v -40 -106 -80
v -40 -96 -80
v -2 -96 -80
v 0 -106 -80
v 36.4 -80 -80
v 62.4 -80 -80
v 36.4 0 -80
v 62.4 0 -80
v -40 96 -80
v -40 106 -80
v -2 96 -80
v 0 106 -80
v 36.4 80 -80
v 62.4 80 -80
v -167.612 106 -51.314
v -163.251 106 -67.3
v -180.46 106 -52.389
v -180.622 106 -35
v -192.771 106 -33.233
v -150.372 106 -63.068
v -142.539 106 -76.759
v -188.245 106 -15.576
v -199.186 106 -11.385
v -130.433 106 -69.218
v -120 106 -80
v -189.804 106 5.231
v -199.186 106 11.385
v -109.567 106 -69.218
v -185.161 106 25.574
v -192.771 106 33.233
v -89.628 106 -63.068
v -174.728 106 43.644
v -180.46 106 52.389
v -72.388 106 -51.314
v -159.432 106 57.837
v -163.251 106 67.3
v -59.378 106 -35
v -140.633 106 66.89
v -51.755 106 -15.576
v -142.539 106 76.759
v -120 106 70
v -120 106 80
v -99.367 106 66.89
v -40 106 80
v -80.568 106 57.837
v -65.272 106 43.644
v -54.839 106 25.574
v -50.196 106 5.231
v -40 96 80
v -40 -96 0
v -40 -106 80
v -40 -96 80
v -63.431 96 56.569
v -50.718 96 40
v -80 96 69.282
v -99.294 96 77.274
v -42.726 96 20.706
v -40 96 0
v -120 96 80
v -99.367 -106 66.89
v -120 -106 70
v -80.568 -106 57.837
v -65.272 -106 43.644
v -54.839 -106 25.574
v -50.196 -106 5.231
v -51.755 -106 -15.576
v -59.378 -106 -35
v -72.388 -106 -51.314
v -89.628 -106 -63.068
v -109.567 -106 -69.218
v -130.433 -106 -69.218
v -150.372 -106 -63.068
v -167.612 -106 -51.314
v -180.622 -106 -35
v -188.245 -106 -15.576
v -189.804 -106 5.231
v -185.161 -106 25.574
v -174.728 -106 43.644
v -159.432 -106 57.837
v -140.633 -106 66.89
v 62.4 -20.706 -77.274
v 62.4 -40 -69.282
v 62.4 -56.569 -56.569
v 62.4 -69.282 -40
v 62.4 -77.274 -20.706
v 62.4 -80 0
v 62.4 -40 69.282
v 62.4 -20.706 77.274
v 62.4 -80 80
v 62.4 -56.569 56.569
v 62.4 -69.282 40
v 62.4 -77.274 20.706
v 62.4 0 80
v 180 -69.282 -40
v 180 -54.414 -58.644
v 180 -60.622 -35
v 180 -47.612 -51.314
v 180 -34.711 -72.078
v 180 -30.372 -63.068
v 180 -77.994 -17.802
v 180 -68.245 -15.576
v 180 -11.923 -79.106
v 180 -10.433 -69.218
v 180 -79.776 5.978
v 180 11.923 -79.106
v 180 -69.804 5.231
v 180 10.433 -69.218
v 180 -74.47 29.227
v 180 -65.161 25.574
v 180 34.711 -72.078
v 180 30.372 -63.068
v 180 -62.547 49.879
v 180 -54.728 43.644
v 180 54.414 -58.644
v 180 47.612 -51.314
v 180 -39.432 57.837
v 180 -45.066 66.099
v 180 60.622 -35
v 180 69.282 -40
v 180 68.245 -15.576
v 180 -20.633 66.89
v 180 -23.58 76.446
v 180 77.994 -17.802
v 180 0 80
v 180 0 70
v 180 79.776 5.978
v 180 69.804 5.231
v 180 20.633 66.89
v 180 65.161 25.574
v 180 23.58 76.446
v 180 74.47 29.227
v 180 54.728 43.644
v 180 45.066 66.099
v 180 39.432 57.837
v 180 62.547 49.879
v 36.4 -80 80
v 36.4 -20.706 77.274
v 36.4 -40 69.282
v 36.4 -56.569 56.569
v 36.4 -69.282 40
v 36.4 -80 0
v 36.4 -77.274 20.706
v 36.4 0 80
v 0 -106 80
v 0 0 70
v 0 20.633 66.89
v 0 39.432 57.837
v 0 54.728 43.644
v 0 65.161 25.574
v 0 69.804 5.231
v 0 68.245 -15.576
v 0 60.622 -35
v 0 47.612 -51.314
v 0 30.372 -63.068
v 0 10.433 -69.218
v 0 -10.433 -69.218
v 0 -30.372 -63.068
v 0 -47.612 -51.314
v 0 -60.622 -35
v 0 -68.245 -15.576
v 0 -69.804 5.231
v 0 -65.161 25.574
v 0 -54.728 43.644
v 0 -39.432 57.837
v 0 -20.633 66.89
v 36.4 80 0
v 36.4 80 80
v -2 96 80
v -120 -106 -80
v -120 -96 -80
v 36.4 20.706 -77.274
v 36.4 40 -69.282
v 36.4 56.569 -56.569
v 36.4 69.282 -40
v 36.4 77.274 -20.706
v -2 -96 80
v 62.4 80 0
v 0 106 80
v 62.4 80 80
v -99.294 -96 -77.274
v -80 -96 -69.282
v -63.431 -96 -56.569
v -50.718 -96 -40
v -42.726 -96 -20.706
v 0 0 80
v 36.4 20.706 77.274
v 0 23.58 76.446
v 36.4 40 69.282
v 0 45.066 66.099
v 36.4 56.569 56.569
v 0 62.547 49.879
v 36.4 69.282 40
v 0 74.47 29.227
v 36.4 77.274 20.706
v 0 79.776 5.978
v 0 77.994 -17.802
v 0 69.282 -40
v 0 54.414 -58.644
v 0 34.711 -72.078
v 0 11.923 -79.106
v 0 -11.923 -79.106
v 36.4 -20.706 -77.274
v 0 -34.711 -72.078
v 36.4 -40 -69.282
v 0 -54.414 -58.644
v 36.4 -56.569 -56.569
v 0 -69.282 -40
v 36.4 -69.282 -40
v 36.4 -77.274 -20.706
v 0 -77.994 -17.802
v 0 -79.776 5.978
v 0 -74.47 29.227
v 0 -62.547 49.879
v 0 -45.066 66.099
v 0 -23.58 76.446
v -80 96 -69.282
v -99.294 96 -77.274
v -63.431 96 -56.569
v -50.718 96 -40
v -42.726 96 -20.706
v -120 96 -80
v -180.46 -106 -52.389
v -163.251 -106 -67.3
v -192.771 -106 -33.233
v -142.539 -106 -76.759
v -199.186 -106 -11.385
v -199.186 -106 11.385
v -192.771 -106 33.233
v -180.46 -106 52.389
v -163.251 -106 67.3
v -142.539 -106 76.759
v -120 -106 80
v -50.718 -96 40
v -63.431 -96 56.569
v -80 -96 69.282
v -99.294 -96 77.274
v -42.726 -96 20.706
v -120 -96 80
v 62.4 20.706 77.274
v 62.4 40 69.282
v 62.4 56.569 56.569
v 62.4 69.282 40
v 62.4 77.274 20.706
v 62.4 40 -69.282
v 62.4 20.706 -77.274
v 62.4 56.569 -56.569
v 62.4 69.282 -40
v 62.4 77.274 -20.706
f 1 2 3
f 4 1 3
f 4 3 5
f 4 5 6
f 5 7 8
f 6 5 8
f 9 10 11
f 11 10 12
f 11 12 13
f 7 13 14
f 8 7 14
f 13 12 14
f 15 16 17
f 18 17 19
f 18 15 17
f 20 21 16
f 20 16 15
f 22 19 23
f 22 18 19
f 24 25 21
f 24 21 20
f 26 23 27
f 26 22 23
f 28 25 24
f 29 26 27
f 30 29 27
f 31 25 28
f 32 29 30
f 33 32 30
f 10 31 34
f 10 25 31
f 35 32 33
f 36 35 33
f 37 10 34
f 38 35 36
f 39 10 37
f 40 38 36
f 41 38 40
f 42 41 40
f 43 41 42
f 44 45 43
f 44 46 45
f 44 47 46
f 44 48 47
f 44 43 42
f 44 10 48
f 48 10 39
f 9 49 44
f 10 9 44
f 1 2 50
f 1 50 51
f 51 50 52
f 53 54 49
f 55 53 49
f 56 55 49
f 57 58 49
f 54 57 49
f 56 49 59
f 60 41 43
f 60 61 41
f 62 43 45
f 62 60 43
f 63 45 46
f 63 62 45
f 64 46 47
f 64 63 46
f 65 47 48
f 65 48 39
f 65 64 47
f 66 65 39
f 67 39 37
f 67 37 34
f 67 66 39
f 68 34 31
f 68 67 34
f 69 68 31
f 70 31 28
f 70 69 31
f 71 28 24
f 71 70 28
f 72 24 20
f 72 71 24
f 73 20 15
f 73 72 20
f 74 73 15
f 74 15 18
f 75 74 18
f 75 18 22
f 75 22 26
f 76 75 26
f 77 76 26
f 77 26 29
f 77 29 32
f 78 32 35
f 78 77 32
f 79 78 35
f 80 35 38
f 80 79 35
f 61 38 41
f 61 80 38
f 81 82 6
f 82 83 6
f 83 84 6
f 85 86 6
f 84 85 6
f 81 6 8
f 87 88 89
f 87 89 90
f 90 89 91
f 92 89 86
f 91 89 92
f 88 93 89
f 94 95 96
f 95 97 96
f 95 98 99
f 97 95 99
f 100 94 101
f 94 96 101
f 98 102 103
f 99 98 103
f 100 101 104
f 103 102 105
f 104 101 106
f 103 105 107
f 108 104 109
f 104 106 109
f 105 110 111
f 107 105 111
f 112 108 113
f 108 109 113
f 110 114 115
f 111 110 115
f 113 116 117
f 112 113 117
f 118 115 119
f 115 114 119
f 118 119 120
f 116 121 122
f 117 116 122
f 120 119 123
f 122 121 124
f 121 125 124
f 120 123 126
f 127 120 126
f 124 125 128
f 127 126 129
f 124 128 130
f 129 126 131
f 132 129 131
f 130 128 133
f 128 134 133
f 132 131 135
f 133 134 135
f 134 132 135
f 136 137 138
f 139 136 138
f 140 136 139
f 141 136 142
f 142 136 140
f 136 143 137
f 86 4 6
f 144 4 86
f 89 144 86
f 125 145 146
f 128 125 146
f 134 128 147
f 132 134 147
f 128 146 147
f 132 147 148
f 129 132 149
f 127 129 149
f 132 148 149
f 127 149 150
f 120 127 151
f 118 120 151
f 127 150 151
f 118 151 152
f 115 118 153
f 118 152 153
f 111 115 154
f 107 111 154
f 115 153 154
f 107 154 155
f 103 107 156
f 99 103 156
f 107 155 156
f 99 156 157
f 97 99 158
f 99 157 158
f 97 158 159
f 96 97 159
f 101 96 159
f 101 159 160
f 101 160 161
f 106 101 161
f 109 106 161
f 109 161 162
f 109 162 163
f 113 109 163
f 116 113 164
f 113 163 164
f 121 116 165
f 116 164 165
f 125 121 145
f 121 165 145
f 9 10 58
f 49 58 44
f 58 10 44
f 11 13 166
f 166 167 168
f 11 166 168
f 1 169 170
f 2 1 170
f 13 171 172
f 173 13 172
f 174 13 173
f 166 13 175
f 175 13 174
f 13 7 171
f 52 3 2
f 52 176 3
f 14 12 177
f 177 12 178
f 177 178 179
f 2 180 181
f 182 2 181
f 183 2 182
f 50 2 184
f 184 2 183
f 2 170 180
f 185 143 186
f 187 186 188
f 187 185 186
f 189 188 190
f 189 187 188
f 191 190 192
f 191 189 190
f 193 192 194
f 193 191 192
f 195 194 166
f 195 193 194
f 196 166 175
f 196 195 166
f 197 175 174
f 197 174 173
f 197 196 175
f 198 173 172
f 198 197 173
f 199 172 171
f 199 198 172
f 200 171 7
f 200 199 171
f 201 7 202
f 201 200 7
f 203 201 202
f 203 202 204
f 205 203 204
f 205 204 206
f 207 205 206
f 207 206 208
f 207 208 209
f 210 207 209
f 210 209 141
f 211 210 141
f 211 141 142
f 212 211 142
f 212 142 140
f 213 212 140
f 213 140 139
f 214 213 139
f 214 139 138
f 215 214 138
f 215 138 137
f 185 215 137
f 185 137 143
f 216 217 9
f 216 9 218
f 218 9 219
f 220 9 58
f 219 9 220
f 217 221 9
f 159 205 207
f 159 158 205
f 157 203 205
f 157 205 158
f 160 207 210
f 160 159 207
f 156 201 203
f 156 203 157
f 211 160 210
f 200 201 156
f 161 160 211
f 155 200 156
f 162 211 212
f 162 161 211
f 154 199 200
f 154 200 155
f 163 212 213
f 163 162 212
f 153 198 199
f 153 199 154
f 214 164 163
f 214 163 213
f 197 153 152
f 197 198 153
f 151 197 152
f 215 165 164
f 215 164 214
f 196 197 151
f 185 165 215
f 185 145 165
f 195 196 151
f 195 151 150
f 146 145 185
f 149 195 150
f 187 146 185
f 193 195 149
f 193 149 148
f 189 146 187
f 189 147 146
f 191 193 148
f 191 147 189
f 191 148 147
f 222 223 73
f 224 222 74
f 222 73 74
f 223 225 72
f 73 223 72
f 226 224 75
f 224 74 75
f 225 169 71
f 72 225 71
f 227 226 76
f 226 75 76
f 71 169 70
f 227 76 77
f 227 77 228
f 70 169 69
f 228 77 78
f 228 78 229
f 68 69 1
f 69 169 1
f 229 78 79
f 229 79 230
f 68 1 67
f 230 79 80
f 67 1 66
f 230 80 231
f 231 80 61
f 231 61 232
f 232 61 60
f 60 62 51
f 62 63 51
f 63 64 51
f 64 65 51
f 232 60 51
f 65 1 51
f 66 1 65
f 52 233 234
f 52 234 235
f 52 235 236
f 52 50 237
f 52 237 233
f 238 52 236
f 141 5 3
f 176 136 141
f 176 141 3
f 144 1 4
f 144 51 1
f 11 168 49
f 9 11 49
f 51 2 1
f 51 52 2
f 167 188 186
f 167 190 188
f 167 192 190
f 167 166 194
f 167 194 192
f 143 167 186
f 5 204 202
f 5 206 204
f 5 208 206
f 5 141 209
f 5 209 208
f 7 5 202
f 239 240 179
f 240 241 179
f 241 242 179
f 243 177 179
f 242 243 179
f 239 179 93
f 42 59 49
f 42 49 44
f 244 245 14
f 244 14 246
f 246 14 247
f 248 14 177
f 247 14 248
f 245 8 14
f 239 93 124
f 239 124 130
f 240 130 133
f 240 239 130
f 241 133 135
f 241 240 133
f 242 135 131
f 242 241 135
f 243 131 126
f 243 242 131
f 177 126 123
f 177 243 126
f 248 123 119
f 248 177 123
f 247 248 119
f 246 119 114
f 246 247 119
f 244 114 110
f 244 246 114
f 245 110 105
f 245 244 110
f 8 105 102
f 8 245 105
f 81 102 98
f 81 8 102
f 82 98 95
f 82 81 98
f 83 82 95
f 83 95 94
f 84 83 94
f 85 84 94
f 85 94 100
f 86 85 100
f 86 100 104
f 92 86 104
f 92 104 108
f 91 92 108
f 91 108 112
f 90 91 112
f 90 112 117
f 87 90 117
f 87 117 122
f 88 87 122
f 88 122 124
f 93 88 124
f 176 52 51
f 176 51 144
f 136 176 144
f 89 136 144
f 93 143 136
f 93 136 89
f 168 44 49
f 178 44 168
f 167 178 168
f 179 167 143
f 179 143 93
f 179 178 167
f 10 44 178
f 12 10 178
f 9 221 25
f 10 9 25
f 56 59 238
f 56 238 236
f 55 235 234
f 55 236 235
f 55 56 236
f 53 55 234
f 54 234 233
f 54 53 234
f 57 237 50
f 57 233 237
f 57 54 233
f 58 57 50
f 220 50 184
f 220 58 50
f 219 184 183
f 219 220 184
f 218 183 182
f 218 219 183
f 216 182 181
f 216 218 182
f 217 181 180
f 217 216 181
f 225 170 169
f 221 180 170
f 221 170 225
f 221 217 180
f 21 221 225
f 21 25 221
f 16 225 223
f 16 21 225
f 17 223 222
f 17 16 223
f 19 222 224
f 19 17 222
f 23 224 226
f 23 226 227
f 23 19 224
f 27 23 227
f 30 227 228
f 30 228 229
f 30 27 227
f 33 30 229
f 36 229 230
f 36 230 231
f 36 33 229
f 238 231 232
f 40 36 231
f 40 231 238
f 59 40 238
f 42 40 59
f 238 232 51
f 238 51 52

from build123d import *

# Parameters (mm, degrees)
SKETCH1_R                = 80
SKETCH1_R_2              = 70
BOSS_EXTRUDE1_DEPTH      = 106
SKETCH2_R                = 80
SKETCH2_R_2              = 70
BOSS_EXTRUDE2_DEPTH      = 180
BOSS_EXTRUDE4_DEPTH      = 80
BOSS_EXTRUDE4_2_DEPTH    = 80
BOSS_EXTRUDE8_REACH      = 258.975
BOSS_EXTRUDE8_END_RADIUS = 80
SKETCH6_W                = 160
SKETCH6_H                = 10
BOSS_EXTRUDE9_REACH      = 286.598
SKETCH7_W                = 26
SKETCH7_H                = 160
BOSS_EXTRUDE10_REACH     = 286.598
SKETCH9_W                = 26
SKETCH9_H                = 160


with BuildPart() as part:
    # Sketch1 → Boss-Extrude1 (new, symmetric)
    with BuildSketch(Plane(origin=(0, 0, 0), x_dir=(1, 0, 0), z_dir=(0, 1, 0))):
        with Locations(Location((-120, 0, 0), (0, 0, 270))):
            Circle(SKETCH1_R)
        with Locations(Location((-120, 0, 0), (0, 0, 270))):
            Circle(SKETCH1_R_2, mode=Mode.SUBTRACT)
    extrude(amount=BOSS_EXTRUDE1_DEPTH, both=True)

    # Boss-Extrude8: up to this cylinder (the profile starts outside it)
    boss_extrude8_end = Plane(origin=(-120, 0, 0), z_dir=(0, -1, 0)) * Cylinder(BOSS_EXTRUDE8_END_RADIUS, 880.95, mode=Mode.PRIVATE)
    # Sketch6 → Boss-Extrude8 (add, up to the surface)
    with BuildSketch(Plane.ZY.offset(40), mode=Mode.PRIVATE) as boss_extrude8_sk1:
        with Locations((0, -101)):
            Rectangle(SKETCH6_W, SKETCH6_H)
    boss_extrude8_tool1 = extrude(boss_extrude8_sk1.sketch, amount=BOSS_EXTRUDE8_REACH, mode=Mode.PRIVATE) - boss_extrude8_end
    add(boss_extrude8_tool1.solids().sort_by_distance((-40, -101, 0))[0])
    add(boss_extrude8_tool1.solids().sort_by_distance((-40, -101, 0))[1])
    # Sketch6 → Boss-Extrude8 (add, up to the surface)
    with BuildSketch(Plane.ZY.offset(40), mode=Mode.PRIVATE) as boss_extrude8_sk2:
        with Locations((0, 101)):
            Rectangle(SKETCH6_W, SKETCH6_H)
    boss_extrude8_tool2 = extrude(boss_extrude8_sk2.sketch, amount=BOSS_EXTRUDE8_REACH, mode=Mode.PRIVATE) - boss_extrude8_end
    add(boss_extrude8_tool2.solids().sort_by_distance((-40, 101, 0))[0])
    add(boss_extrude8_tool2.solids().sort_by_distance((-40, 101, 0))[1])


with BuildPart() as body_2:
    # Sketch2 → Boss-Extrude2 (new body)
    with BuildSketch(Plane.ZY):
        Circle(SKETCH2_R)
        Circle(SKETCH2_R_2, mode=Mode.SUBTRACT)
    extrude(amount=-BOSS_EXTRUDE2_DEPTH)

    # Sketch7 → Boss-Extrude9 (add, up to next)
    with BuildSketch(Plane(origin=(0, -80, 0), x_dir=(1, 0, 0), z_dir=(0, 1, 0)), mode=Mode.PRIVATE) as boss_extrude9_sk1:
        with Locations((49.4, 0)):
            Rectangle(SKETCH7_W, SKETCH7_H)
    boss_extrude9_tool1 = extrude(boss_extrude9_sk1.sketch, amount=BOSS_EXTRUDE9_REACH, mode=Mode.PRIVATE) - body_2.part


with BuildPart() as body_3:
    # Sketch4 → Boss-Extrude4 (new, symmetric)
    with BuildSketch(Plane.XY):
        Polygon((-40, 106), (0, 106), (62.4, 80), (36.4, 80), (-2, 96), (-40, 96), align=None)
    extrude(amount=BOSS_EXTRUDE4_DEPTH, both=True)


with BuildPart() as body_4:
    # Sketch4 → Boss-Extrude4 2 (new, symmetric)
    with BuildSketch(Plane.XY):
        Polygon((-40, -106), (0, -106), (62.4, -80), (36.4, -80), (-2, -96), (-40, -96), align=None)
    extrude(amount=BOSS_EXTRUDE4_2_DEPTH, both=True)


with BuildPart() as body_2_1:
    add(body_2.part)

    add(body_4.part)  # Boss-Extrude9 merges body 4
    add(boss_extrude9_tool1.solids().sort_by_distance((49.4, -80, 0))[0])
    add(boss_extrude9_tool1.solids().sort_by_distance((49.4, -80, 0))[1])

    # Sketch9 → Boss-Extrude10 (add, up to next)
    with BuildSketch(Plane.XZ.offset(-80), mode=Mode.PRIVATE) as boss_extrude10_sk1:
        with Locations((49.4, 0)):
            Rectangle(SKETCH9_W, SKETCH9_H)
    boss_extrude10_tool1 = extrude(boss_extrude10_sk1.sketch, amount=BOSS_EXTRUDE10_REACH, mode=Mode.PRIVATE) - body_2_1.part

    add(body_3.part)  # Boss-Extrude10 merges body 3
    add(boss_extrude10_tool1.solids().sort_by_distance((49.4, 80, 0))[0])
    add(boss_extrude10_tool1.solids().sort_by_distance((49.4, 80, 0))[1])


solid = Compound([part.part, body_2_1.part])
